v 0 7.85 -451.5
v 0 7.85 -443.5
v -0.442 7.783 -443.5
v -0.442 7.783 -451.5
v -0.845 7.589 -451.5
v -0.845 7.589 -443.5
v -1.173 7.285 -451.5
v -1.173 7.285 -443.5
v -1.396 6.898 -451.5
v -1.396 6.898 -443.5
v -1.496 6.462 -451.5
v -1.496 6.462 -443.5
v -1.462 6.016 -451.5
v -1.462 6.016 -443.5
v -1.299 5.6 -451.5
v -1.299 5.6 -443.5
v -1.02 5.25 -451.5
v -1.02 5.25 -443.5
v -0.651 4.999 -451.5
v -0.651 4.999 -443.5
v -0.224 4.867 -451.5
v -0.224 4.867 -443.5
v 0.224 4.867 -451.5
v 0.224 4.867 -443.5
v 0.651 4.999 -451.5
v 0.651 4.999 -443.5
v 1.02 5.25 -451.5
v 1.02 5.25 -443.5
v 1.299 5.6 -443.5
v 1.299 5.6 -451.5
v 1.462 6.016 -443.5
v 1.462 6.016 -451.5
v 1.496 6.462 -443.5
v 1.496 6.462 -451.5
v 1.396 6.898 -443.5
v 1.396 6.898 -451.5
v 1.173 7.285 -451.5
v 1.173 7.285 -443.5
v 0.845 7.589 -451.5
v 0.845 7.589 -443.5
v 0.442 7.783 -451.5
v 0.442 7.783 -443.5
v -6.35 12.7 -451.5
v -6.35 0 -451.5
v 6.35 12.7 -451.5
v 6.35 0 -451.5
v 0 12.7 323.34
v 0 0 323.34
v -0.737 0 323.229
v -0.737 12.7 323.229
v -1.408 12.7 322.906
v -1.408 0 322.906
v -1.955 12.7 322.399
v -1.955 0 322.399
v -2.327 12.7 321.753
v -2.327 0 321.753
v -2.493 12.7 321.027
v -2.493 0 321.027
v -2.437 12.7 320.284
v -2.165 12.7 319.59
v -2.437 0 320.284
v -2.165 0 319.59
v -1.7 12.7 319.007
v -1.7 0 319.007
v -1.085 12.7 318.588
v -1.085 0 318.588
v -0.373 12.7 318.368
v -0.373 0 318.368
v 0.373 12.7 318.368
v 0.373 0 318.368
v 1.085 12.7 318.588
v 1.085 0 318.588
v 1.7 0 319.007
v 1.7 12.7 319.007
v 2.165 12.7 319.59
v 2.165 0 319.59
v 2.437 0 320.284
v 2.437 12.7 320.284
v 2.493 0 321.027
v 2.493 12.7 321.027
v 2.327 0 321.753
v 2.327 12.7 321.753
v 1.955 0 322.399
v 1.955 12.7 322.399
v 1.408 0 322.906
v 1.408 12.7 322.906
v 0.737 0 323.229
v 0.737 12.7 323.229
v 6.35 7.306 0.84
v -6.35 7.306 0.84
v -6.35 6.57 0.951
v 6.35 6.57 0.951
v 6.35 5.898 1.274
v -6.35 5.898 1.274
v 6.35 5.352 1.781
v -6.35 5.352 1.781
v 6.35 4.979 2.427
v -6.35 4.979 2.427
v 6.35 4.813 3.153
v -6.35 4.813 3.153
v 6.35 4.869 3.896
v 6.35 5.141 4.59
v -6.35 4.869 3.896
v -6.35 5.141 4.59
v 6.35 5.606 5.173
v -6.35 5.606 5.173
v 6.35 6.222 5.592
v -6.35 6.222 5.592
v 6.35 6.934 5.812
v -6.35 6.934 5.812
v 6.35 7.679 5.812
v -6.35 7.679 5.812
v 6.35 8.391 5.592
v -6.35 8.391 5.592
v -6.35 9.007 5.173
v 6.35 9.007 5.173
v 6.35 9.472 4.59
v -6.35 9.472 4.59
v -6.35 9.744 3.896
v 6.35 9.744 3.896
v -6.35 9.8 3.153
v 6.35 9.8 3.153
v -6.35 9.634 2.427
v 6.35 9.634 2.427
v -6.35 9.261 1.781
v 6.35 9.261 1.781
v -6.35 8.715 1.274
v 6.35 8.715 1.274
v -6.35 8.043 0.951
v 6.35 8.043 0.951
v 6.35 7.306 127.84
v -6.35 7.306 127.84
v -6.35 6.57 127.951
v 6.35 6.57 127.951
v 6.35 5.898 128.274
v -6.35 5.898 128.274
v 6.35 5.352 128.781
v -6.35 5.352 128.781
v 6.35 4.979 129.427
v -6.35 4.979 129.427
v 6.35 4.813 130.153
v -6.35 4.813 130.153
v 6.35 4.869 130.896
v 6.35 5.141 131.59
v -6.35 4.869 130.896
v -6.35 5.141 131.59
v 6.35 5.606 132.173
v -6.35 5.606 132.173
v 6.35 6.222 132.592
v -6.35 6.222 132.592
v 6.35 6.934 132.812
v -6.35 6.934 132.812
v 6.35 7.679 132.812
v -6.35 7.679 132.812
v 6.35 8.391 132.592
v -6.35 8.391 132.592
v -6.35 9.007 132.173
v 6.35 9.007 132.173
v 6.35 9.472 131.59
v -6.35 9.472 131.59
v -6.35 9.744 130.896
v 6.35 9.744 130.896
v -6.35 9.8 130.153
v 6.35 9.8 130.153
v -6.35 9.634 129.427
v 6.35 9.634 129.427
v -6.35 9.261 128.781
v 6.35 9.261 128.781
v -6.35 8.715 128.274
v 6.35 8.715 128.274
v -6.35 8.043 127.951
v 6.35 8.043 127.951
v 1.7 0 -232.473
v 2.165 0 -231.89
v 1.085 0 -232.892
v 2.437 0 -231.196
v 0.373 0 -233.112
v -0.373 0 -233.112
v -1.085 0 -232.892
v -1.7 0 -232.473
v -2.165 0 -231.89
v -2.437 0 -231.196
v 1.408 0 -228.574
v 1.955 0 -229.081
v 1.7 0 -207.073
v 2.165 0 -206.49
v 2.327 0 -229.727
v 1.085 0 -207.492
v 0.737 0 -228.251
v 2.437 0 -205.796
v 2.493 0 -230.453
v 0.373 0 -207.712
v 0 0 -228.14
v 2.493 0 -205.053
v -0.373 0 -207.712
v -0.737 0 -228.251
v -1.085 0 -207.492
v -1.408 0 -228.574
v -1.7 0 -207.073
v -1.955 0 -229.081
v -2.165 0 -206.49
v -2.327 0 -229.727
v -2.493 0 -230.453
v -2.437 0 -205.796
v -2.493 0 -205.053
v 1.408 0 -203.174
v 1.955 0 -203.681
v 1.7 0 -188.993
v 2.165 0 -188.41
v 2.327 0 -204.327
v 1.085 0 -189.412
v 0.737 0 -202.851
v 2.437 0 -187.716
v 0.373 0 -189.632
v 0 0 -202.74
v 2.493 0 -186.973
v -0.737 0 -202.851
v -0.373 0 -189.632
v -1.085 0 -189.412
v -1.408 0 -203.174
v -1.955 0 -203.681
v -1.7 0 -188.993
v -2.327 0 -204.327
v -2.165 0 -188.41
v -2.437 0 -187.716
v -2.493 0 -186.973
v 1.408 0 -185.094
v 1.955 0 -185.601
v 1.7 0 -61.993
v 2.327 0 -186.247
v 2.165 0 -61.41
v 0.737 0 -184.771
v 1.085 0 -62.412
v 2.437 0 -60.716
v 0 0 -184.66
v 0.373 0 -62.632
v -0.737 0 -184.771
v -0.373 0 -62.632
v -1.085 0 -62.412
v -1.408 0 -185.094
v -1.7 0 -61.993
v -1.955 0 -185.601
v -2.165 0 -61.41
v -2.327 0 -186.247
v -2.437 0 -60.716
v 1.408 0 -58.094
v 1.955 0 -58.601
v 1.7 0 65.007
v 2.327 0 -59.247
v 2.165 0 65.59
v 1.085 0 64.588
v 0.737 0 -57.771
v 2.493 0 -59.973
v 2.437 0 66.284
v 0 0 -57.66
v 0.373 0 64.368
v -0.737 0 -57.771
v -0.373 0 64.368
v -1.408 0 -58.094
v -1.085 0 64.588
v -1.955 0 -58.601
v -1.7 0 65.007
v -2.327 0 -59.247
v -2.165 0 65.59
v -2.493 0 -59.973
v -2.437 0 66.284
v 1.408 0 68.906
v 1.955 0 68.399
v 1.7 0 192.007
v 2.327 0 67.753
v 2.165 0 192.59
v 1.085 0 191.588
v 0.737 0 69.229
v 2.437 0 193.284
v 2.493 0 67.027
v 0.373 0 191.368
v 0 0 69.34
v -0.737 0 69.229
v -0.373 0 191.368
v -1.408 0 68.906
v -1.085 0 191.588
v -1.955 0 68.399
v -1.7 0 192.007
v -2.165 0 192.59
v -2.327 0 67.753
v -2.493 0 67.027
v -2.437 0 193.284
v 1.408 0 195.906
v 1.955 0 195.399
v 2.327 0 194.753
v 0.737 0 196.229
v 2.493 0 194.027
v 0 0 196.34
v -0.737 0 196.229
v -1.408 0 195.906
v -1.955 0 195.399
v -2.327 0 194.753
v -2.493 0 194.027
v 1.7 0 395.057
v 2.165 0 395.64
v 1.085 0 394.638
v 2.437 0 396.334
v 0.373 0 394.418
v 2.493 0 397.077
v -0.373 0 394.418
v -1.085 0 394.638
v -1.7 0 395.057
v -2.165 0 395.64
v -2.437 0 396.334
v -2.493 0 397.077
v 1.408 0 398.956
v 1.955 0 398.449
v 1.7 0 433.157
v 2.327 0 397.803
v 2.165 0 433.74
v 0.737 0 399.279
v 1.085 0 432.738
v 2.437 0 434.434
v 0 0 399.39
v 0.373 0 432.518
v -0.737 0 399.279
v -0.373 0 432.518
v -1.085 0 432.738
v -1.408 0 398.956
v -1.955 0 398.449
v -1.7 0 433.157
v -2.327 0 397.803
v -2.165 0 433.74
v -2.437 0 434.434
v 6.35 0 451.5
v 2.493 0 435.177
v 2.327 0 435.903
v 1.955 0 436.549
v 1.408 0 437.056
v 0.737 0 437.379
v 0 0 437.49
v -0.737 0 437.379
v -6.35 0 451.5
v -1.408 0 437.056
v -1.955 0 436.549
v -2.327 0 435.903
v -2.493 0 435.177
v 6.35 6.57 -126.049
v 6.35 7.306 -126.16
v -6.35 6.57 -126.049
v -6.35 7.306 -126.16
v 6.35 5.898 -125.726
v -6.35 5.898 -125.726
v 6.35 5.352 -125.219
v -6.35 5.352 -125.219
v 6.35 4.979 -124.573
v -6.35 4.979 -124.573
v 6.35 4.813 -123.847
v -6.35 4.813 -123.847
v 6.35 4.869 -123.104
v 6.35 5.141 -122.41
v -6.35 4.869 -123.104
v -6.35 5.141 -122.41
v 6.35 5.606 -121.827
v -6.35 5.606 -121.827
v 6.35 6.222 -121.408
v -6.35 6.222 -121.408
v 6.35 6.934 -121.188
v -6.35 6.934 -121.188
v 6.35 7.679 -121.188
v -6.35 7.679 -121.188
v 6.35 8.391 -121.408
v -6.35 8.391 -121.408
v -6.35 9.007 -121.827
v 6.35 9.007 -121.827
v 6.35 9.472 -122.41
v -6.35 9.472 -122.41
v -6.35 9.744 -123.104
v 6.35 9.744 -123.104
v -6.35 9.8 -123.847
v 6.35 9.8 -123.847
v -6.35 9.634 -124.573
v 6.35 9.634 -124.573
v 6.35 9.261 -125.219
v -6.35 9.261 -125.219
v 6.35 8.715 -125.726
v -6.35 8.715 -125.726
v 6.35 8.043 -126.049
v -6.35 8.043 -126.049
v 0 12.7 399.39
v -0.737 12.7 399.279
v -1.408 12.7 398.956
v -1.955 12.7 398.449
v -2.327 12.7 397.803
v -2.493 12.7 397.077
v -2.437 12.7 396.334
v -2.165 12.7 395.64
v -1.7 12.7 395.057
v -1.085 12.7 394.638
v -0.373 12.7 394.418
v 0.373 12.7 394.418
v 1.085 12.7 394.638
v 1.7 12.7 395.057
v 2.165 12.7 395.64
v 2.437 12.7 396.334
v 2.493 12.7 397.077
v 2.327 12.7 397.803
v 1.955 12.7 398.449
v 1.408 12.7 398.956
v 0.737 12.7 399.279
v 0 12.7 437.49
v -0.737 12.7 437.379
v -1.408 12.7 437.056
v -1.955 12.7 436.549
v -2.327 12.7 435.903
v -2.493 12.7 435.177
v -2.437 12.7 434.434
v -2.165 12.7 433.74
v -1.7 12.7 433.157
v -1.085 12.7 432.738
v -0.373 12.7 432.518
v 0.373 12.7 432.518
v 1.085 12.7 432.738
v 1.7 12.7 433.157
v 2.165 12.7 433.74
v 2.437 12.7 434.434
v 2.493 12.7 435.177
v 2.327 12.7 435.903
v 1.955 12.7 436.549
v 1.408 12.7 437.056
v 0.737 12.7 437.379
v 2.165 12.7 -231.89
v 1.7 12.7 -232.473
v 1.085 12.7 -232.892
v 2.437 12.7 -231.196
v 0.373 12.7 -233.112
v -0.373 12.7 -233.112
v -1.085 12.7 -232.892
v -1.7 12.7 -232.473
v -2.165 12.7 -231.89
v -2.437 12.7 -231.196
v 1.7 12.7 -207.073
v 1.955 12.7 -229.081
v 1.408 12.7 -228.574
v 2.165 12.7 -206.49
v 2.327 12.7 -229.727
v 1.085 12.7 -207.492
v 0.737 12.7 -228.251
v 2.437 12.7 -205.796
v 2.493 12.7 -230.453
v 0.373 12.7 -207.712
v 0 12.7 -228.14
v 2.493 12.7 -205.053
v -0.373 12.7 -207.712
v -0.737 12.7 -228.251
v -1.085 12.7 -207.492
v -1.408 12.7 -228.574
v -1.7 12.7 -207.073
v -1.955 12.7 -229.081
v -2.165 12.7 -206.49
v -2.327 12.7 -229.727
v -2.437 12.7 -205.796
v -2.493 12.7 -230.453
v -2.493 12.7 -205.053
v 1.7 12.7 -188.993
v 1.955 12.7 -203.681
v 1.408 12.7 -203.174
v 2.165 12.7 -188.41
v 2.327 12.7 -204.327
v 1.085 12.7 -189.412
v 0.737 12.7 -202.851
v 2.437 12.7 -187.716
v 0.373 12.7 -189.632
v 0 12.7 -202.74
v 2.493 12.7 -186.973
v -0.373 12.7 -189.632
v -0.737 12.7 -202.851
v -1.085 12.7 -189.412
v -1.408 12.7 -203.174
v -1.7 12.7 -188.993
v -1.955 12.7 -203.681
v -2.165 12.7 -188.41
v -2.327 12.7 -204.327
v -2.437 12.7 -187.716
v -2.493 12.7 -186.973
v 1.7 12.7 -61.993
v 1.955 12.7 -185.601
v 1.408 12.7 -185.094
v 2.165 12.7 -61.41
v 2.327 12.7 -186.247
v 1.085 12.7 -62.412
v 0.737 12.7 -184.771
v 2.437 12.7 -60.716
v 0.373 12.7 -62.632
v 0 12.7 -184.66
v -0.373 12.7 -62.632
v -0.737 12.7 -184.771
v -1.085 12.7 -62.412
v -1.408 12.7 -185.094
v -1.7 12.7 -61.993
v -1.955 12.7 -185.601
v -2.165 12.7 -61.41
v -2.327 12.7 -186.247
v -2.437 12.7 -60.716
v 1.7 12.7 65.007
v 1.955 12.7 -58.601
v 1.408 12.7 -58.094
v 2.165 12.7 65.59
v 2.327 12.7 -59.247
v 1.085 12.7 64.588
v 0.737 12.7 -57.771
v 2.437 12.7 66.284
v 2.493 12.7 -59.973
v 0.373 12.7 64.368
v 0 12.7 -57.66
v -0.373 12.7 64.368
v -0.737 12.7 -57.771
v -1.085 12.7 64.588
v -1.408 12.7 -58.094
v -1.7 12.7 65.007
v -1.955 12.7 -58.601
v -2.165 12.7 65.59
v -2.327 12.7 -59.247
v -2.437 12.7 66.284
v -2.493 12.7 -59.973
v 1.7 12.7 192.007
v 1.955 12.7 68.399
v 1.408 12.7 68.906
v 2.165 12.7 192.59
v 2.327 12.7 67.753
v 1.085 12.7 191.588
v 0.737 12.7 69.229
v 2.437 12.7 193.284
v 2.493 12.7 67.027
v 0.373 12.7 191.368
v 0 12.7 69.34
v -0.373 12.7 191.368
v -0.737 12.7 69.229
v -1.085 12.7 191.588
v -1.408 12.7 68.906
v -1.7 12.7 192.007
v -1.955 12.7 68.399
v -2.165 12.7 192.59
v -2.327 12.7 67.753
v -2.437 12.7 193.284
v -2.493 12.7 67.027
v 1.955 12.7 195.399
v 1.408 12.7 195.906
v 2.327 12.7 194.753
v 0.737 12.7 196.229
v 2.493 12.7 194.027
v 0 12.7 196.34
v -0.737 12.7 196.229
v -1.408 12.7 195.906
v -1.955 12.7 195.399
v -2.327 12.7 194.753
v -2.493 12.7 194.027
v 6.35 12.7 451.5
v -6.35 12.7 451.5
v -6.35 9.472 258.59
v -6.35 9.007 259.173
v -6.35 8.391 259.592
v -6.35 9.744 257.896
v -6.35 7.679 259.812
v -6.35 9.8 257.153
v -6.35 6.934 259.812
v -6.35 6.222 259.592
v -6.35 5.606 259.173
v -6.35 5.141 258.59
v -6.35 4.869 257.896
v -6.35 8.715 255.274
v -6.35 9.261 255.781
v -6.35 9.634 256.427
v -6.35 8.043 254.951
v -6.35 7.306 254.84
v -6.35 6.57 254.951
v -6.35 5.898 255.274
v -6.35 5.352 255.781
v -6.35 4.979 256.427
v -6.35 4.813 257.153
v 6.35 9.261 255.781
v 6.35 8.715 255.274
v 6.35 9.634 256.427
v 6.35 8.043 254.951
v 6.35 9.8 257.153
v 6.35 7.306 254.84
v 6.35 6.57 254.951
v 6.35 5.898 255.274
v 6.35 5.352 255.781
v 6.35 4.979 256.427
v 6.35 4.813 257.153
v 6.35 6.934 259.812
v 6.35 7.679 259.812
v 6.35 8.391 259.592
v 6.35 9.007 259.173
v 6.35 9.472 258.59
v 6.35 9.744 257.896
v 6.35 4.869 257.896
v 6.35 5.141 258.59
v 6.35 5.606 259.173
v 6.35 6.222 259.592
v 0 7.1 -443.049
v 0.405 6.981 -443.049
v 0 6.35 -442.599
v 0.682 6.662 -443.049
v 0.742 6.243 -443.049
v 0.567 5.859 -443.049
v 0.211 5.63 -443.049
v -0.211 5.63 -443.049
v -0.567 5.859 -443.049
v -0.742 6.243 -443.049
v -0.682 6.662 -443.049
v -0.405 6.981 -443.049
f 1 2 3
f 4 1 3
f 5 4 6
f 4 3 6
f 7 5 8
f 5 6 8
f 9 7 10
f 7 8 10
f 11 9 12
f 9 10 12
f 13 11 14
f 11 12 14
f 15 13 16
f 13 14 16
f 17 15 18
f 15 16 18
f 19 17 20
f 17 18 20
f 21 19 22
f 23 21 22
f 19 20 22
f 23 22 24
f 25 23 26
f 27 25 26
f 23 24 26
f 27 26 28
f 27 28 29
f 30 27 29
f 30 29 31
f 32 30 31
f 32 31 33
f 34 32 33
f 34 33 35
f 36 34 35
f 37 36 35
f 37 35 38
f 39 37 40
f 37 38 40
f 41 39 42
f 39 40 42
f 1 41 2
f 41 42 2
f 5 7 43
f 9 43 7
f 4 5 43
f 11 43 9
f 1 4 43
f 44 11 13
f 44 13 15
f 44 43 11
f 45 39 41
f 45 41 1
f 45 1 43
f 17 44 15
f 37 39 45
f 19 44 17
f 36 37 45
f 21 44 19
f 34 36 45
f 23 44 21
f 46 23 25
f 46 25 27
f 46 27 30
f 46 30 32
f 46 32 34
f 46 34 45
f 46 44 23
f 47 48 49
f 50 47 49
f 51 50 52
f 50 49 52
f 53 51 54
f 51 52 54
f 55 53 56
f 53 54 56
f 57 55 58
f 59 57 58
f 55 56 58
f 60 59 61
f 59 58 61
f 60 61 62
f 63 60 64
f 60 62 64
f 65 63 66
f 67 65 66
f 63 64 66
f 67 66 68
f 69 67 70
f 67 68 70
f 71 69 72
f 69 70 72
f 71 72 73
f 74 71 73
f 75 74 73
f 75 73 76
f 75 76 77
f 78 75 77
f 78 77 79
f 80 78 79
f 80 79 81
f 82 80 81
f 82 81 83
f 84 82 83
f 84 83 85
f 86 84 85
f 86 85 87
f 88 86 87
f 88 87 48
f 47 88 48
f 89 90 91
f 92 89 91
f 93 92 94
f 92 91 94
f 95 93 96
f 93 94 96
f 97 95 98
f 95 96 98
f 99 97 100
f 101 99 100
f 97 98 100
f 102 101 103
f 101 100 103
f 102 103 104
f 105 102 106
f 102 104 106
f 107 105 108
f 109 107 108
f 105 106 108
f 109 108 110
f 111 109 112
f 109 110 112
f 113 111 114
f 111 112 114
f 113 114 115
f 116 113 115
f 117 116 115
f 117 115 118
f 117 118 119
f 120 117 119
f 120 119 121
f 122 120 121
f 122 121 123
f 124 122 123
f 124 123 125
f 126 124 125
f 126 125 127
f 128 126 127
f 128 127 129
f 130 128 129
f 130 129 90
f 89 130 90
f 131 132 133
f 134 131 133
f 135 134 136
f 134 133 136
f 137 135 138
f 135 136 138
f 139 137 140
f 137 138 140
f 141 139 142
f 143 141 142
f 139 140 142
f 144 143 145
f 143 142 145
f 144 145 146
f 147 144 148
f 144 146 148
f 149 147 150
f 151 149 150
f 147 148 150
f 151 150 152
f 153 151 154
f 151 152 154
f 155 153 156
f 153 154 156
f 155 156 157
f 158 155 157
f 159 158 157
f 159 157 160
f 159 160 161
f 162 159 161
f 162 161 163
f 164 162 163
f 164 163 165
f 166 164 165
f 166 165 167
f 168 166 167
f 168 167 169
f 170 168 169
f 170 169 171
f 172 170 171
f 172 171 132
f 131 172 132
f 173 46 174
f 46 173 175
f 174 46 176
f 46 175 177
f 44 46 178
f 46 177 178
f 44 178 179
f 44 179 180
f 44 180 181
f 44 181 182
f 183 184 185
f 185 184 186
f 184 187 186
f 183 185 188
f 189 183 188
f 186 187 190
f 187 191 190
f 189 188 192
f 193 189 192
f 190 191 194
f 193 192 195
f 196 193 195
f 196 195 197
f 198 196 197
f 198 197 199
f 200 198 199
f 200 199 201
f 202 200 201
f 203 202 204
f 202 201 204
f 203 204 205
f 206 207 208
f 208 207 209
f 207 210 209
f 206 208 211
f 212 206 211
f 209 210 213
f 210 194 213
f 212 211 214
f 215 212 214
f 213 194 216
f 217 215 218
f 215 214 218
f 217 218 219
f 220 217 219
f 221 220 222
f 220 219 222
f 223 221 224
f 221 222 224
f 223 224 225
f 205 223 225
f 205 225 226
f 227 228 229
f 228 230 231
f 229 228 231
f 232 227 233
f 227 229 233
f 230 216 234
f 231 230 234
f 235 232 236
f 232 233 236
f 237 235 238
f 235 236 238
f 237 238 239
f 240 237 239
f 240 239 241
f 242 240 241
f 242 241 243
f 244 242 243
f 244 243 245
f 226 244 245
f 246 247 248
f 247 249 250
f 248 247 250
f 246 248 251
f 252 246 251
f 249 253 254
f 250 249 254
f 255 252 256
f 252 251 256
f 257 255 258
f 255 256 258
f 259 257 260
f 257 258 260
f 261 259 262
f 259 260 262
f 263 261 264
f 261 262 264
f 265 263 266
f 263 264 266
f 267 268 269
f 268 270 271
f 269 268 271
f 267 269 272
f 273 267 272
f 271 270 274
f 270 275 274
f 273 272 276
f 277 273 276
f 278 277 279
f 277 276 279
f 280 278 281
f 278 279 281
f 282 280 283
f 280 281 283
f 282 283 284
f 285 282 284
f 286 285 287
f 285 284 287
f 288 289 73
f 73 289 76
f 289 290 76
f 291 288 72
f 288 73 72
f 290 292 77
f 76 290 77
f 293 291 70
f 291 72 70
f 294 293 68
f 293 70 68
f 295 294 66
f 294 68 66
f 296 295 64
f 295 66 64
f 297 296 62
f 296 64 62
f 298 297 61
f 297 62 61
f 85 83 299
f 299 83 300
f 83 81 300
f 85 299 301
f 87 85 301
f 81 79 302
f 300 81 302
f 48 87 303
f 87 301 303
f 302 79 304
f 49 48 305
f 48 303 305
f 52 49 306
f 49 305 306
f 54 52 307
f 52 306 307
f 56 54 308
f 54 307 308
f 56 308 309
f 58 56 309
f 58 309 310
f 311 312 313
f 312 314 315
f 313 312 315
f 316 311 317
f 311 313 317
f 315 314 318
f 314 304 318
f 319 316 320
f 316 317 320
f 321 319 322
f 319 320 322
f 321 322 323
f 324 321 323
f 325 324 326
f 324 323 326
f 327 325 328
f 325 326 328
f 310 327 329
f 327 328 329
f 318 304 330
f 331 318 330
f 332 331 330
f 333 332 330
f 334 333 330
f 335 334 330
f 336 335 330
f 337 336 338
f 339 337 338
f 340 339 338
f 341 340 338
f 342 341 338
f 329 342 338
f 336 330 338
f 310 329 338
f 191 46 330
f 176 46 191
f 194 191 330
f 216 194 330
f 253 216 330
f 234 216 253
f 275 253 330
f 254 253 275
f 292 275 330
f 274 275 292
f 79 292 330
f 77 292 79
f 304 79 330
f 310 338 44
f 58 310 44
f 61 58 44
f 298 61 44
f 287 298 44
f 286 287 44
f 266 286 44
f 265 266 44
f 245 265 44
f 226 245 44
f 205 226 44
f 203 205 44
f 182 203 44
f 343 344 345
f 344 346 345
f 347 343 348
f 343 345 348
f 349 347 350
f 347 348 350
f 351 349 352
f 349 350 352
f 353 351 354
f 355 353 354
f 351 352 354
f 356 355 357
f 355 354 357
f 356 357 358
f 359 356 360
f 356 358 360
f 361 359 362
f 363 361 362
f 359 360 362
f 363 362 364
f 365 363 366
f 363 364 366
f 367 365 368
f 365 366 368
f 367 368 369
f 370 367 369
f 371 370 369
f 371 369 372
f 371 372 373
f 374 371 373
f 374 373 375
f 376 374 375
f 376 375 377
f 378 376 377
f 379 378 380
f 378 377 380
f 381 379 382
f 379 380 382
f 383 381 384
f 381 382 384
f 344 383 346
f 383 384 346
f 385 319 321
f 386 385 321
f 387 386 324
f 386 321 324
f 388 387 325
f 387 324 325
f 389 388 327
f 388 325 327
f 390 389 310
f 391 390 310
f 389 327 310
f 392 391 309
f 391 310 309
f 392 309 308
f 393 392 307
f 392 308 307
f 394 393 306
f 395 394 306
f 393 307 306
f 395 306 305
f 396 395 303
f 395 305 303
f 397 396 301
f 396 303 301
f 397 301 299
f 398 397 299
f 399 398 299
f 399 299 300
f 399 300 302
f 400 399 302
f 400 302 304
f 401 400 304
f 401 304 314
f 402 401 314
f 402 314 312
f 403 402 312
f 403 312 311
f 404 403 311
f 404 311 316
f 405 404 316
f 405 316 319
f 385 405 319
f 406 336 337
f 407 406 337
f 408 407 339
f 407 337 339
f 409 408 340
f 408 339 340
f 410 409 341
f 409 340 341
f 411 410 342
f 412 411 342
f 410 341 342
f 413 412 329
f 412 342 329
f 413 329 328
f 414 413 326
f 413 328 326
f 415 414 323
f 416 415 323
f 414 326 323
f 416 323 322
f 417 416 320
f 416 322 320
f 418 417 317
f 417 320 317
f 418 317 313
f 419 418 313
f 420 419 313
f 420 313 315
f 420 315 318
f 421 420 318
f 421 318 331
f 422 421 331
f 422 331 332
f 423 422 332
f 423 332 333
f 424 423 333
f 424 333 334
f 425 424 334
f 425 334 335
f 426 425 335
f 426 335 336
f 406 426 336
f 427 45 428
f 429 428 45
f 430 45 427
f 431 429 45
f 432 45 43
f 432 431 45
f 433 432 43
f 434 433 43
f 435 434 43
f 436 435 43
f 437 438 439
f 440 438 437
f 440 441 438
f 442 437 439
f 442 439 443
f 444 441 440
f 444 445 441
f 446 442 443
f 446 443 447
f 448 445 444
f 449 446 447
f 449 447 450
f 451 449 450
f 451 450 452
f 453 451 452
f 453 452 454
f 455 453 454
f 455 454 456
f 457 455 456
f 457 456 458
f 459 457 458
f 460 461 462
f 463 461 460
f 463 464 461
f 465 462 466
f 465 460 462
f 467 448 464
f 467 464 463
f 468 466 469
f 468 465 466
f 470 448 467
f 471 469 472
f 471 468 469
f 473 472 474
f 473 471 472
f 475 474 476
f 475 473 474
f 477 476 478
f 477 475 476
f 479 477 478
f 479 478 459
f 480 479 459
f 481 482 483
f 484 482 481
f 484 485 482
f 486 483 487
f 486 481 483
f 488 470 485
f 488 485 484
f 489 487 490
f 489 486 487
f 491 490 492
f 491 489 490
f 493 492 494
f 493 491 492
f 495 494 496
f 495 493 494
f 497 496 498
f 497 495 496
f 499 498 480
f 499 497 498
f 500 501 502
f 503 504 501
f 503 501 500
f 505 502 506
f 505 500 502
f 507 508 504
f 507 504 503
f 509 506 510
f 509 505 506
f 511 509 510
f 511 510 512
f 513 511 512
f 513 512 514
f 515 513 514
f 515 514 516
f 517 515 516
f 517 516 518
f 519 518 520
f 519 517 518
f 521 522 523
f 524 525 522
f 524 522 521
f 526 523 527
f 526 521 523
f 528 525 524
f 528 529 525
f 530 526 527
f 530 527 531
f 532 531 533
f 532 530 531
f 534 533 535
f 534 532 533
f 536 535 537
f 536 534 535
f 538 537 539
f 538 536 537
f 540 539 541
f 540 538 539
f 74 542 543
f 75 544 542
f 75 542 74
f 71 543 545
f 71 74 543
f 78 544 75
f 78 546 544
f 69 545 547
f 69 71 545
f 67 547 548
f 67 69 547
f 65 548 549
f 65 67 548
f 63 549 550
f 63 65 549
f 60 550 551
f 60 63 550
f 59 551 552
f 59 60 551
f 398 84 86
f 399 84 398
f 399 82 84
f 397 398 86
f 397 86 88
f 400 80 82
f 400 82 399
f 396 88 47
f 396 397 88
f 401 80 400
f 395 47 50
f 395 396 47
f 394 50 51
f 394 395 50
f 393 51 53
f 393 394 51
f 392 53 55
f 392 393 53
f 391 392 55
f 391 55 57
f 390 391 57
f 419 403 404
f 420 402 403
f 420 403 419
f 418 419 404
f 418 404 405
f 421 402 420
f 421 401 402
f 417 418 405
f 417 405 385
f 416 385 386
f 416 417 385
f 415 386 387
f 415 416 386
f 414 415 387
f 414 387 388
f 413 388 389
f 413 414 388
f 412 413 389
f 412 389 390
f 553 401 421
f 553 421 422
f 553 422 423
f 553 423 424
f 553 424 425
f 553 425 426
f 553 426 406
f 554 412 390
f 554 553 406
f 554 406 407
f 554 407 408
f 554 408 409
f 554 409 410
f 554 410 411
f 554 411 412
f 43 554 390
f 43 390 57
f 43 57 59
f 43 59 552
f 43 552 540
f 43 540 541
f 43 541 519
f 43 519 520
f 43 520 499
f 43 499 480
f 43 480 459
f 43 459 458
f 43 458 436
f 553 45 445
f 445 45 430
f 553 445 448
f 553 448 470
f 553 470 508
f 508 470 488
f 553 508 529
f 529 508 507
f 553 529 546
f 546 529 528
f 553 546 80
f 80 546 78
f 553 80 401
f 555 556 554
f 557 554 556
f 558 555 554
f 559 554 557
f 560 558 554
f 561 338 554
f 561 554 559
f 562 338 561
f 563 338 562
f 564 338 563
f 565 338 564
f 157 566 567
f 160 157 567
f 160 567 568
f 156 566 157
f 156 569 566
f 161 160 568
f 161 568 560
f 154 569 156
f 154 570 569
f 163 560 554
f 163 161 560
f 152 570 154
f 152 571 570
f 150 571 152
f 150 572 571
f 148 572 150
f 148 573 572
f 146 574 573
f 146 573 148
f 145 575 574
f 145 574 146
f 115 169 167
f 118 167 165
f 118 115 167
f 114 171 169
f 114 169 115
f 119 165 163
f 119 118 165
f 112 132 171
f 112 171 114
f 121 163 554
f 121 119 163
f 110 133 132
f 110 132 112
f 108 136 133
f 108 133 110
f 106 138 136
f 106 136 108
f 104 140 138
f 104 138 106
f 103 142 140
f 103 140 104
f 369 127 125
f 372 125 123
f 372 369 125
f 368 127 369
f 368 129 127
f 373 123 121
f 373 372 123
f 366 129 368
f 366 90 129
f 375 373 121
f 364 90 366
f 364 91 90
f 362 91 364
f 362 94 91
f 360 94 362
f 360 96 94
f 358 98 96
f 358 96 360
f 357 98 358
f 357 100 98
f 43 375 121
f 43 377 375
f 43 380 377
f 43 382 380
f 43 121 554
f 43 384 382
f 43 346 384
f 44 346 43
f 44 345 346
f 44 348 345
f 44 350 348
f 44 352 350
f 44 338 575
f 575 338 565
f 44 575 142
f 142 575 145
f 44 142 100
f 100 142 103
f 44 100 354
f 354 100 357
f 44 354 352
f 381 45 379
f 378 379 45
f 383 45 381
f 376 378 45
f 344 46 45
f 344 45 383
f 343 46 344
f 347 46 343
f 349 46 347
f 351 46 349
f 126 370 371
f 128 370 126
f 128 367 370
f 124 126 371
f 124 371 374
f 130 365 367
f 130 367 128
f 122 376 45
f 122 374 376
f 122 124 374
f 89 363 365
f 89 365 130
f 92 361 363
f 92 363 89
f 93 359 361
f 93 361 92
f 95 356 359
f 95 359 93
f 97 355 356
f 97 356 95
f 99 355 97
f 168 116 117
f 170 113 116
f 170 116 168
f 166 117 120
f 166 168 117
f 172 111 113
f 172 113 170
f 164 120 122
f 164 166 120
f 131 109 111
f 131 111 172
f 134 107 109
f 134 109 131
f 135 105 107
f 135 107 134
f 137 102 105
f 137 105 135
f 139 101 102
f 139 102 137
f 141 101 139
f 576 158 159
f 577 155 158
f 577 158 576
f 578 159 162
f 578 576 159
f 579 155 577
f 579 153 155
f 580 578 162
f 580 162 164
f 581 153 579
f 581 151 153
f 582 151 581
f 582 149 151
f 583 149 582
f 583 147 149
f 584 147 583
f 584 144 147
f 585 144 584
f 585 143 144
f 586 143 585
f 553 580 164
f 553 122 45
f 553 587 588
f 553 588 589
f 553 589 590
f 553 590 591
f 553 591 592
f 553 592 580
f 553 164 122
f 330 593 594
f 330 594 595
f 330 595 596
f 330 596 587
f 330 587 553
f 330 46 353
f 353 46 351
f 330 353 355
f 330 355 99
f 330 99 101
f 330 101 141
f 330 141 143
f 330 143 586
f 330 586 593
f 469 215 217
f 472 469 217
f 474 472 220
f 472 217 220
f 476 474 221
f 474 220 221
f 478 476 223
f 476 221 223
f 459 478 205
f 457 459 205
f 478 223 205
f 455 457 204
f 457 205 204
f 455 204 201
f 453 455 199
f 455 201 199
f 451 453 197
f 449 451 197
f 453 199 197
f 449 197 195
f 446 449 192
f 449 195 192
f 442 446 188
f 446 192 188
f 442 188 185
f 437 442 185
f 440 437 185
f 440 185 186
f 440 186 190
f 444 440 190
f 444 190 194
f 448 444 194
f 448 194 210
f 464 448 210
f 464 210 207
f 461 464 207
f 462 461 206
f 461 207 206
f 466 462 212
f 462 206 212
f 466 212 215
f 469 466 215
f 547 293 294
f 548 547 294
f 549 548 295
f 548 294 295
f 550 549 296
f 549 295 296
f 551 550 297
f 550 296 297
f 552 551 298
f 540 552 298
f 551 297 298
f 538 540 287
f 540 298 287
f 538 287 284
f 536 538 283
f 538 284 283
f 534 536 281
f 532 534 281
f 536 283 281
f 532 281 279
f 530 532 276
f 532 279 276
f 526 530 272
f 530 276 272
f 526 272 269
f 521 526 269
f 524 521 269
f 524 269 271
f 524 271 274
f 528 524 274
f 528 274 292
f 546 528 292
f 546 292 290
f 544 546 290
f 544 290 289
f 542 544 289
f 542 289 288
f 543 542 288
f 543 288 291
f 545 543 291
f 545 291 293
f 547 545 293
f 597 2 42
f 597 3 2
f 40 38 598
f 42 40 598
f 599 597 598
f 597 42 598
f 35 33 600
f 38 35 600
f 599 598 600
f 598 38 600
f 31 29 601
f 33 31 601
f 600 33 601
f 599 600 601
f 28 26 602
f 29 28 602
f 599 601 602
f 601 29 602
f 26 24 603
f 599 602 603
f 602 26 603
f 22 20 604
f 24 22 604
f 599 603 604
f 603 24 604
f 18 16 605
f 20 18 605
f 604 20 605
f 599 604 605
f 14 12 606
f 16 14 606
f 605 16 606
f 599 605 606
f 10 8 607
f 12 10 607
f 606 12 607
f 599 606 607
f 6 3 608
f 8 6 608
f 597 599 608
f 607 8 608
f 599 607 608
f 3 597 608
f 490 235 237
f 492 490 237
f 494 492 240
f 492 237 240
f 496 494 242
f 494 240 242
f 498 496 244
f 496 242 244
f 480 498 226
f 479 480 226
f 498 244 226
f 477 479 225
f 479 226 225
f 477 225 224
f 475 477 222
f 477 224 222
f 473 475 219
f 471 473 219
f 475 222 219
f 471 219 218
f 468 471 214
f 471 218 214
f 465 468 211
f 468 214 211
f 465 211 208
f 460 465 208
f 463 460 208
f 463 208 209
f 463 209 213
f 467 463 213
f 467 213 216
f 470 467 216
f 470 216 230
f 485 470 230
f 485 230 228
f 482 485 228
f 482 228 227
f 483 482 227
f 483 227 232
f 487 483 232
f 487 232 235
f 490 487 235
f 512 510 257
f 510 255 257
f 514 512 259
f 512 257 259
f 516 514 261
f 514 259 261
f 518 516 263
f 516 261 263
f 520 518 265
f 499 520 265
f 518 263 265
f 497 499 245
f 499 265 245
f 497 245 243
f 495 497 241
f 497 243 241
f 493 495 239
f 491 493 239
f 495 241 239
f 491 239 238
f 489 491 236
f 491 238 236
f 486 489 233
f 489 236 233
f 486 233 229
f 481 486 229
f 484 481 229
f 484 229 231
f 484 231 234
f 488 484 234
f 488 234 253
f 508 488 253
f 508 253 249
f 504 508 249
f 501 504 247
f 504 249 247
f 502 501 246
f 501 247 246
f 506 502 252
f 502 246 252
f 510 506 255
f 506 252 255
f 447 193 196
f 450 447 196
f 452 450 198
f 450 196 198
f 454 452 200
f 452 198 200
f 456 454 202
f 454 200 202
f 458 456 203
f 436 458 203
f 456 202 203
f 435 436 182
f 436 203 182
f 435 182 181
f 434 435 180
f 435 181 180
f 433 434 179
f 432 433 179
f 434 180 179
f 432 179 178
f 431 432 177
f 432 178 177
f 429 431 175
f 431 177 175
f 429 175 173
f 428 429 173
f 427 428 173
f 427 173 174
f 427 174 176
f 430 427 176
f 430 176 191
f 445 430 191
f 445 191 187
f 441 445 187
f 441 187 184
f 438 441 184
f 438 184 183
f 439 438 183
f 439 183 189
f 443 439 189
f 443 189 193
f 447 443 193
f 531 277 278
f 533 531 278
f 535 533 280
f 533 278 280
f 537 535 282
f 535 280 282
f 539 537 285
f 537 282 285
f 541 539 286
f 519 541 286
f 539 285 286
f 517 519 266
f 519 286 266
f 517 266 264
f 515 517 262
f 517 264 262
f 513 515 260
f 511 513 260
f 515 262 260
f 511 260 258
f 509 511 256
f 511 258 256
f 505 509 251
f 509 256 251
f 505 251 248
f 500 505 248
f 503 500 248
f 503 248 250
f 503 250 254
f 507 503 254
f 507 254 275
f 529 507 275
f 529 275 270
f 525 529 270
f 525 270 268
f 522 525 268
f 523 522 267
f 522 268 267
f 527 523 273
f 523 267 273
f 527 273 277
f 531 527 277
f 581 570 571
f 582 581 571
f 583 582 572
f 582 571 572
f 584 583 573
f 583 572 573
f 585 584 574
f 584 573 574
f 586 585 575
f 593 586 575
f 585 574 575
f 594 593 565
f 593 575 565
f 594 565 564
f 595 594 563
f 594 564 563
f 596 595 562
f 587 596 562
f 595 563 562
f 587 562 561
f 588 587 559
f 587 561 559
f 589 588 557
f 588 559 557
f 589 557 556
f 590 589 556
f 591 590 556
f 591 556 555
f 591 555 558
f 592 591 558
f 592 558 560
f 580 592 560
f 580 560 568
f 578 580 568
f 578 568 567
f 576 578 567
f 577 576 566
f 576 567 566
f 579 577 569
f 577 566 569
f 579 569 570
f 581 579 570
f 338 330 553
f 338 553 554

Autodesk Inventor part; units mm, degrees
ref_plane "YZ Plane" through (0, 0, 0) normal (1, 0, 0) x (0, 1, 0)
ref_plane "XZ Plane" through (0, 0, 0) normal (0, 1, 0) x (-1, 0, 0)
ref_plane "XY Plane" through (0, 0, 0) normal (0, 0, 1) x (1, 0, 0)
sketch "Sketch1" plane through (0, 0, 0) normal (0, 1, 0) x (-1, 0, 0)
  line L0 (6.35, -451.5) -> (-6.35, -451.5)
  line L1 (-6.35, -451.5) -> (-6.35, 451.5)
  line L2 (-6.35, 451.5) -> (6.35, 451.5)
  line L3 (6.35, 451.5) -> (6.35, -451.5)
  line L4 (6.35, -451.5) -> (-6.35, 451.5) construction
  line L5 (-6.35, -451.5) -> (6.35, 451.5) construction
  point P0 (0, 0)
  dimension "d0" = 12.7
  dimension "d1" = 903
extrude "Extrusion1" add sketch "Sketch1" along normal blind 12.7
sketch "Sketch2" plane through (0, 12.7, 0) normal (0, 1, 0) x (1, 0, 0)
  circle A0 centre (0, -434.99) radius 2.5
  line L0 (-6.35, -451.5) -> (6.35, -451.5) projected
  point P0 (0, 0)
  dimension "d4" = 5
  dimension "d5" = 16.51
sketch "Sketch3" plane through (0, 12.7, 0) normal (0, 1, 0) x (1, 0, 0)
  circle A0 centre (0, -396.89) radius 2.5
  line L0 (-6.35, -451.5) -> (6.35, -451.5) projected
  point P0 (0, 0)
  dimension "d6" = 5
  dimension "d7" = 54.61
sketch "Sketch4" plane through (0, 12.7, 0) normal (0, 1, 0) x (1, 0, 0)
  circle A0 centre (0, -320.84) radius 2.5
  line L0 (-6.35, -451.5) -> (6.35, -451.5) projected
  point P0 (0, 0)
  dimension "d8" = 5
  dimension "d9" = 130.66
sketch "Sketch5" plane through (0, 12.7, 0) normal (0, 1, 0) x (1, 0, 0)
  circle A0 centre (0, -193.84) radius 2.5
  line L0 (-6.35, -451.5) -> (6.35, -451.5) projected
  point P0 (0, 0)
  dimension "d10" = 5
  dimension "d11" = 257.66
sketch "Sketch6" plane through (0, 12.7, 0) normal (0, 1, 0) x (1, 0, 0)
  circle A0 centre (0, -66.84) radius 2.5
  line L0 (-6.35, -451.5) -> (6.35, -451.5) projected
  point P0 (0, 0)
  dimension "d12" = 5
  dimension "d13" = 384.66
sketch "Sketch7" plane through (0, 12.7, 0) normal (0, 1, 0) x (1, 0, 0)
  circle A0 centre (0, 60.16) radius 2.5
  line L0 (-6.35, -451.5) -> (6.35, -451.5) projected
  point P0 (0, 0)
  dimension "d14" = 5
  dimension "d15" = 511.66
sketch "Sketch8" plane through (0, 12.7, 0) normal (0, 1, 0) x (1, 0, 0)
  circle A0 centre (0, 187.16) radius 2.5
  line L0 (-6.35, -451.5) -> (6.35, -451.5) projected
  point P0 (0, 0)
  dimension "d16" = 5
  dimension "d17" = 638.66
sketch "Sketch9" plane through (0, 12.7, 0) normal (0, 1, 0) x (1, 0, 0)
  circle A0 centre (0, 205.24) radius 2.5
  line L0 (-6.35, -451.5) -> (6.35, -451.5) projected
  point P0 (0, 0)
  dimension "d18" = 5
  dimension "d19" = 656.74
sketch "Sketch10" plane through (0, 12.7, 0) normal (0, 1, 0) x (1, 0, 0)
  circle A0 centre (0, 230.64) radius 2.5
  line L0 (-6.35, -451.5) -> (6.35, -451.5) projected
  point P0 (0, 0)
  dimension "d20" = 5
  dimension "d21" = 682.14
hole "Hole1" at (0, 12.7, 434.99) direction (0, -1, 0) diameter 5 end through all
hole "Hole2" at (0, 12.7, 396.89) direction (0, -1, 0) diameter 5 end through all
hole "Hole3" at (0, 12.7, 320.84) direction (0, -1, 0) diameter 5 end through all
hole "Hole4" at (0, 12.7, 193.84) direction (0, -1, 0) diameter 5 end through all
hole "Hole5" at (0, 12.7, 66.84) direction (0, -1, 0) diameter 5 end through all
hole "Hole6" at (0, 12.7, -60.16) direction (0, -1, 0) diameter 5 end through all
hole "Hole7" at (0, 12.7, -187.16) direction (0, -1, 0) diameter 5 end through all
hole "Hole8" at (0, 12.7, -205.24) direction (0, -1, 0) diameter 5 end through all
hole "Hole9" at (0, 12.7, -230.64) direction (0, -1, 0) diameter 5 end through all
sketch "Sketch11" plane through (6.35, 0, -451.5) normal (0, 0, -1) x (-1, 0, 0)
  circle A0 centre (6.35, 6.35) radius 1.5
  line L0 (0, 0) -> (0, 12.7) projected
  point P0 (6.35, 0)
  dimension "d85" = 3
  dimension "d86" = 6.35
  dimension "d87" = 6.35
hole "Hole10" at (0, 6.35, -451.5) direction (0, 0, 1) diameter 3 depth 8 tip angle 118
thread "Thread1" size "M3x0.5" class "6H" standard "ANSI Metric M Profile" full length
sketch "Sketch12" plane through (6.35, 0, 451.5) normal (1, 0, 0) x (0, 0, -1)
  circle A0 centre (194.16, 7.3065) radius 2.5
  line L0 (0, 0) -> (0, 12.7) projected
  point P0 (451.5, 0)
  dimension "d97" = 5
  dimension "d98" = 194.16
sketch "Sketch13" plane through (6.35, 0, 451.5) normal (1, 0, 0) x (0, 0, -1)
  circle A0 centre (321.16, 7.3065) radius 2.5
  line L0 (0, 0) -> (0, 12.7) projected
  point P0 (451.5, 0)
  dimension "d99" = 5
  dimension "d100" = 321.16
sketch "Sketch14" plane through (6.35, 0, 451.5) normal (1, 0, 0) x (0, 0, -1)
  circle A0 centre (448.16, 7.3065) radius 2.5
  line L0 (0, 0) -> (0, 12.7) projected
  point P0 (451.5, 0)
  dimension "d101" = 5
  dimension "d102" = 448.16
sketch "Sketch15" plane through (6.35, 0, 451.5) normal (1, 0, 0) x (0, 0, -1)
  circle A0 centre (575.16, 7.3065) radius 2.5
  line L0 (0, 0) -> (0, 12.7) projected
  point P0 (451.5, 0)
  dimension "d103" = 5
  dimension "d104" = 575.16
hole "Hole11" at (6.35, 7.3065, 257.34) direction (-1, 0, 0) diameter 5 end through all
hole "Hole12" at (6.35, 7.3065, 130.34) direction (-1, 0, 0) diameter 5 end through all
hole "Hole13" at (6.35, 7.3065, 3.34) direction (-1, 0, 0) diameter 5 end through all
hole "Hole14" at (6.35, 7.3065, -123.66) direction (-1, 0, 0) diameter 5 end through all
properties part number "Plate Support"
